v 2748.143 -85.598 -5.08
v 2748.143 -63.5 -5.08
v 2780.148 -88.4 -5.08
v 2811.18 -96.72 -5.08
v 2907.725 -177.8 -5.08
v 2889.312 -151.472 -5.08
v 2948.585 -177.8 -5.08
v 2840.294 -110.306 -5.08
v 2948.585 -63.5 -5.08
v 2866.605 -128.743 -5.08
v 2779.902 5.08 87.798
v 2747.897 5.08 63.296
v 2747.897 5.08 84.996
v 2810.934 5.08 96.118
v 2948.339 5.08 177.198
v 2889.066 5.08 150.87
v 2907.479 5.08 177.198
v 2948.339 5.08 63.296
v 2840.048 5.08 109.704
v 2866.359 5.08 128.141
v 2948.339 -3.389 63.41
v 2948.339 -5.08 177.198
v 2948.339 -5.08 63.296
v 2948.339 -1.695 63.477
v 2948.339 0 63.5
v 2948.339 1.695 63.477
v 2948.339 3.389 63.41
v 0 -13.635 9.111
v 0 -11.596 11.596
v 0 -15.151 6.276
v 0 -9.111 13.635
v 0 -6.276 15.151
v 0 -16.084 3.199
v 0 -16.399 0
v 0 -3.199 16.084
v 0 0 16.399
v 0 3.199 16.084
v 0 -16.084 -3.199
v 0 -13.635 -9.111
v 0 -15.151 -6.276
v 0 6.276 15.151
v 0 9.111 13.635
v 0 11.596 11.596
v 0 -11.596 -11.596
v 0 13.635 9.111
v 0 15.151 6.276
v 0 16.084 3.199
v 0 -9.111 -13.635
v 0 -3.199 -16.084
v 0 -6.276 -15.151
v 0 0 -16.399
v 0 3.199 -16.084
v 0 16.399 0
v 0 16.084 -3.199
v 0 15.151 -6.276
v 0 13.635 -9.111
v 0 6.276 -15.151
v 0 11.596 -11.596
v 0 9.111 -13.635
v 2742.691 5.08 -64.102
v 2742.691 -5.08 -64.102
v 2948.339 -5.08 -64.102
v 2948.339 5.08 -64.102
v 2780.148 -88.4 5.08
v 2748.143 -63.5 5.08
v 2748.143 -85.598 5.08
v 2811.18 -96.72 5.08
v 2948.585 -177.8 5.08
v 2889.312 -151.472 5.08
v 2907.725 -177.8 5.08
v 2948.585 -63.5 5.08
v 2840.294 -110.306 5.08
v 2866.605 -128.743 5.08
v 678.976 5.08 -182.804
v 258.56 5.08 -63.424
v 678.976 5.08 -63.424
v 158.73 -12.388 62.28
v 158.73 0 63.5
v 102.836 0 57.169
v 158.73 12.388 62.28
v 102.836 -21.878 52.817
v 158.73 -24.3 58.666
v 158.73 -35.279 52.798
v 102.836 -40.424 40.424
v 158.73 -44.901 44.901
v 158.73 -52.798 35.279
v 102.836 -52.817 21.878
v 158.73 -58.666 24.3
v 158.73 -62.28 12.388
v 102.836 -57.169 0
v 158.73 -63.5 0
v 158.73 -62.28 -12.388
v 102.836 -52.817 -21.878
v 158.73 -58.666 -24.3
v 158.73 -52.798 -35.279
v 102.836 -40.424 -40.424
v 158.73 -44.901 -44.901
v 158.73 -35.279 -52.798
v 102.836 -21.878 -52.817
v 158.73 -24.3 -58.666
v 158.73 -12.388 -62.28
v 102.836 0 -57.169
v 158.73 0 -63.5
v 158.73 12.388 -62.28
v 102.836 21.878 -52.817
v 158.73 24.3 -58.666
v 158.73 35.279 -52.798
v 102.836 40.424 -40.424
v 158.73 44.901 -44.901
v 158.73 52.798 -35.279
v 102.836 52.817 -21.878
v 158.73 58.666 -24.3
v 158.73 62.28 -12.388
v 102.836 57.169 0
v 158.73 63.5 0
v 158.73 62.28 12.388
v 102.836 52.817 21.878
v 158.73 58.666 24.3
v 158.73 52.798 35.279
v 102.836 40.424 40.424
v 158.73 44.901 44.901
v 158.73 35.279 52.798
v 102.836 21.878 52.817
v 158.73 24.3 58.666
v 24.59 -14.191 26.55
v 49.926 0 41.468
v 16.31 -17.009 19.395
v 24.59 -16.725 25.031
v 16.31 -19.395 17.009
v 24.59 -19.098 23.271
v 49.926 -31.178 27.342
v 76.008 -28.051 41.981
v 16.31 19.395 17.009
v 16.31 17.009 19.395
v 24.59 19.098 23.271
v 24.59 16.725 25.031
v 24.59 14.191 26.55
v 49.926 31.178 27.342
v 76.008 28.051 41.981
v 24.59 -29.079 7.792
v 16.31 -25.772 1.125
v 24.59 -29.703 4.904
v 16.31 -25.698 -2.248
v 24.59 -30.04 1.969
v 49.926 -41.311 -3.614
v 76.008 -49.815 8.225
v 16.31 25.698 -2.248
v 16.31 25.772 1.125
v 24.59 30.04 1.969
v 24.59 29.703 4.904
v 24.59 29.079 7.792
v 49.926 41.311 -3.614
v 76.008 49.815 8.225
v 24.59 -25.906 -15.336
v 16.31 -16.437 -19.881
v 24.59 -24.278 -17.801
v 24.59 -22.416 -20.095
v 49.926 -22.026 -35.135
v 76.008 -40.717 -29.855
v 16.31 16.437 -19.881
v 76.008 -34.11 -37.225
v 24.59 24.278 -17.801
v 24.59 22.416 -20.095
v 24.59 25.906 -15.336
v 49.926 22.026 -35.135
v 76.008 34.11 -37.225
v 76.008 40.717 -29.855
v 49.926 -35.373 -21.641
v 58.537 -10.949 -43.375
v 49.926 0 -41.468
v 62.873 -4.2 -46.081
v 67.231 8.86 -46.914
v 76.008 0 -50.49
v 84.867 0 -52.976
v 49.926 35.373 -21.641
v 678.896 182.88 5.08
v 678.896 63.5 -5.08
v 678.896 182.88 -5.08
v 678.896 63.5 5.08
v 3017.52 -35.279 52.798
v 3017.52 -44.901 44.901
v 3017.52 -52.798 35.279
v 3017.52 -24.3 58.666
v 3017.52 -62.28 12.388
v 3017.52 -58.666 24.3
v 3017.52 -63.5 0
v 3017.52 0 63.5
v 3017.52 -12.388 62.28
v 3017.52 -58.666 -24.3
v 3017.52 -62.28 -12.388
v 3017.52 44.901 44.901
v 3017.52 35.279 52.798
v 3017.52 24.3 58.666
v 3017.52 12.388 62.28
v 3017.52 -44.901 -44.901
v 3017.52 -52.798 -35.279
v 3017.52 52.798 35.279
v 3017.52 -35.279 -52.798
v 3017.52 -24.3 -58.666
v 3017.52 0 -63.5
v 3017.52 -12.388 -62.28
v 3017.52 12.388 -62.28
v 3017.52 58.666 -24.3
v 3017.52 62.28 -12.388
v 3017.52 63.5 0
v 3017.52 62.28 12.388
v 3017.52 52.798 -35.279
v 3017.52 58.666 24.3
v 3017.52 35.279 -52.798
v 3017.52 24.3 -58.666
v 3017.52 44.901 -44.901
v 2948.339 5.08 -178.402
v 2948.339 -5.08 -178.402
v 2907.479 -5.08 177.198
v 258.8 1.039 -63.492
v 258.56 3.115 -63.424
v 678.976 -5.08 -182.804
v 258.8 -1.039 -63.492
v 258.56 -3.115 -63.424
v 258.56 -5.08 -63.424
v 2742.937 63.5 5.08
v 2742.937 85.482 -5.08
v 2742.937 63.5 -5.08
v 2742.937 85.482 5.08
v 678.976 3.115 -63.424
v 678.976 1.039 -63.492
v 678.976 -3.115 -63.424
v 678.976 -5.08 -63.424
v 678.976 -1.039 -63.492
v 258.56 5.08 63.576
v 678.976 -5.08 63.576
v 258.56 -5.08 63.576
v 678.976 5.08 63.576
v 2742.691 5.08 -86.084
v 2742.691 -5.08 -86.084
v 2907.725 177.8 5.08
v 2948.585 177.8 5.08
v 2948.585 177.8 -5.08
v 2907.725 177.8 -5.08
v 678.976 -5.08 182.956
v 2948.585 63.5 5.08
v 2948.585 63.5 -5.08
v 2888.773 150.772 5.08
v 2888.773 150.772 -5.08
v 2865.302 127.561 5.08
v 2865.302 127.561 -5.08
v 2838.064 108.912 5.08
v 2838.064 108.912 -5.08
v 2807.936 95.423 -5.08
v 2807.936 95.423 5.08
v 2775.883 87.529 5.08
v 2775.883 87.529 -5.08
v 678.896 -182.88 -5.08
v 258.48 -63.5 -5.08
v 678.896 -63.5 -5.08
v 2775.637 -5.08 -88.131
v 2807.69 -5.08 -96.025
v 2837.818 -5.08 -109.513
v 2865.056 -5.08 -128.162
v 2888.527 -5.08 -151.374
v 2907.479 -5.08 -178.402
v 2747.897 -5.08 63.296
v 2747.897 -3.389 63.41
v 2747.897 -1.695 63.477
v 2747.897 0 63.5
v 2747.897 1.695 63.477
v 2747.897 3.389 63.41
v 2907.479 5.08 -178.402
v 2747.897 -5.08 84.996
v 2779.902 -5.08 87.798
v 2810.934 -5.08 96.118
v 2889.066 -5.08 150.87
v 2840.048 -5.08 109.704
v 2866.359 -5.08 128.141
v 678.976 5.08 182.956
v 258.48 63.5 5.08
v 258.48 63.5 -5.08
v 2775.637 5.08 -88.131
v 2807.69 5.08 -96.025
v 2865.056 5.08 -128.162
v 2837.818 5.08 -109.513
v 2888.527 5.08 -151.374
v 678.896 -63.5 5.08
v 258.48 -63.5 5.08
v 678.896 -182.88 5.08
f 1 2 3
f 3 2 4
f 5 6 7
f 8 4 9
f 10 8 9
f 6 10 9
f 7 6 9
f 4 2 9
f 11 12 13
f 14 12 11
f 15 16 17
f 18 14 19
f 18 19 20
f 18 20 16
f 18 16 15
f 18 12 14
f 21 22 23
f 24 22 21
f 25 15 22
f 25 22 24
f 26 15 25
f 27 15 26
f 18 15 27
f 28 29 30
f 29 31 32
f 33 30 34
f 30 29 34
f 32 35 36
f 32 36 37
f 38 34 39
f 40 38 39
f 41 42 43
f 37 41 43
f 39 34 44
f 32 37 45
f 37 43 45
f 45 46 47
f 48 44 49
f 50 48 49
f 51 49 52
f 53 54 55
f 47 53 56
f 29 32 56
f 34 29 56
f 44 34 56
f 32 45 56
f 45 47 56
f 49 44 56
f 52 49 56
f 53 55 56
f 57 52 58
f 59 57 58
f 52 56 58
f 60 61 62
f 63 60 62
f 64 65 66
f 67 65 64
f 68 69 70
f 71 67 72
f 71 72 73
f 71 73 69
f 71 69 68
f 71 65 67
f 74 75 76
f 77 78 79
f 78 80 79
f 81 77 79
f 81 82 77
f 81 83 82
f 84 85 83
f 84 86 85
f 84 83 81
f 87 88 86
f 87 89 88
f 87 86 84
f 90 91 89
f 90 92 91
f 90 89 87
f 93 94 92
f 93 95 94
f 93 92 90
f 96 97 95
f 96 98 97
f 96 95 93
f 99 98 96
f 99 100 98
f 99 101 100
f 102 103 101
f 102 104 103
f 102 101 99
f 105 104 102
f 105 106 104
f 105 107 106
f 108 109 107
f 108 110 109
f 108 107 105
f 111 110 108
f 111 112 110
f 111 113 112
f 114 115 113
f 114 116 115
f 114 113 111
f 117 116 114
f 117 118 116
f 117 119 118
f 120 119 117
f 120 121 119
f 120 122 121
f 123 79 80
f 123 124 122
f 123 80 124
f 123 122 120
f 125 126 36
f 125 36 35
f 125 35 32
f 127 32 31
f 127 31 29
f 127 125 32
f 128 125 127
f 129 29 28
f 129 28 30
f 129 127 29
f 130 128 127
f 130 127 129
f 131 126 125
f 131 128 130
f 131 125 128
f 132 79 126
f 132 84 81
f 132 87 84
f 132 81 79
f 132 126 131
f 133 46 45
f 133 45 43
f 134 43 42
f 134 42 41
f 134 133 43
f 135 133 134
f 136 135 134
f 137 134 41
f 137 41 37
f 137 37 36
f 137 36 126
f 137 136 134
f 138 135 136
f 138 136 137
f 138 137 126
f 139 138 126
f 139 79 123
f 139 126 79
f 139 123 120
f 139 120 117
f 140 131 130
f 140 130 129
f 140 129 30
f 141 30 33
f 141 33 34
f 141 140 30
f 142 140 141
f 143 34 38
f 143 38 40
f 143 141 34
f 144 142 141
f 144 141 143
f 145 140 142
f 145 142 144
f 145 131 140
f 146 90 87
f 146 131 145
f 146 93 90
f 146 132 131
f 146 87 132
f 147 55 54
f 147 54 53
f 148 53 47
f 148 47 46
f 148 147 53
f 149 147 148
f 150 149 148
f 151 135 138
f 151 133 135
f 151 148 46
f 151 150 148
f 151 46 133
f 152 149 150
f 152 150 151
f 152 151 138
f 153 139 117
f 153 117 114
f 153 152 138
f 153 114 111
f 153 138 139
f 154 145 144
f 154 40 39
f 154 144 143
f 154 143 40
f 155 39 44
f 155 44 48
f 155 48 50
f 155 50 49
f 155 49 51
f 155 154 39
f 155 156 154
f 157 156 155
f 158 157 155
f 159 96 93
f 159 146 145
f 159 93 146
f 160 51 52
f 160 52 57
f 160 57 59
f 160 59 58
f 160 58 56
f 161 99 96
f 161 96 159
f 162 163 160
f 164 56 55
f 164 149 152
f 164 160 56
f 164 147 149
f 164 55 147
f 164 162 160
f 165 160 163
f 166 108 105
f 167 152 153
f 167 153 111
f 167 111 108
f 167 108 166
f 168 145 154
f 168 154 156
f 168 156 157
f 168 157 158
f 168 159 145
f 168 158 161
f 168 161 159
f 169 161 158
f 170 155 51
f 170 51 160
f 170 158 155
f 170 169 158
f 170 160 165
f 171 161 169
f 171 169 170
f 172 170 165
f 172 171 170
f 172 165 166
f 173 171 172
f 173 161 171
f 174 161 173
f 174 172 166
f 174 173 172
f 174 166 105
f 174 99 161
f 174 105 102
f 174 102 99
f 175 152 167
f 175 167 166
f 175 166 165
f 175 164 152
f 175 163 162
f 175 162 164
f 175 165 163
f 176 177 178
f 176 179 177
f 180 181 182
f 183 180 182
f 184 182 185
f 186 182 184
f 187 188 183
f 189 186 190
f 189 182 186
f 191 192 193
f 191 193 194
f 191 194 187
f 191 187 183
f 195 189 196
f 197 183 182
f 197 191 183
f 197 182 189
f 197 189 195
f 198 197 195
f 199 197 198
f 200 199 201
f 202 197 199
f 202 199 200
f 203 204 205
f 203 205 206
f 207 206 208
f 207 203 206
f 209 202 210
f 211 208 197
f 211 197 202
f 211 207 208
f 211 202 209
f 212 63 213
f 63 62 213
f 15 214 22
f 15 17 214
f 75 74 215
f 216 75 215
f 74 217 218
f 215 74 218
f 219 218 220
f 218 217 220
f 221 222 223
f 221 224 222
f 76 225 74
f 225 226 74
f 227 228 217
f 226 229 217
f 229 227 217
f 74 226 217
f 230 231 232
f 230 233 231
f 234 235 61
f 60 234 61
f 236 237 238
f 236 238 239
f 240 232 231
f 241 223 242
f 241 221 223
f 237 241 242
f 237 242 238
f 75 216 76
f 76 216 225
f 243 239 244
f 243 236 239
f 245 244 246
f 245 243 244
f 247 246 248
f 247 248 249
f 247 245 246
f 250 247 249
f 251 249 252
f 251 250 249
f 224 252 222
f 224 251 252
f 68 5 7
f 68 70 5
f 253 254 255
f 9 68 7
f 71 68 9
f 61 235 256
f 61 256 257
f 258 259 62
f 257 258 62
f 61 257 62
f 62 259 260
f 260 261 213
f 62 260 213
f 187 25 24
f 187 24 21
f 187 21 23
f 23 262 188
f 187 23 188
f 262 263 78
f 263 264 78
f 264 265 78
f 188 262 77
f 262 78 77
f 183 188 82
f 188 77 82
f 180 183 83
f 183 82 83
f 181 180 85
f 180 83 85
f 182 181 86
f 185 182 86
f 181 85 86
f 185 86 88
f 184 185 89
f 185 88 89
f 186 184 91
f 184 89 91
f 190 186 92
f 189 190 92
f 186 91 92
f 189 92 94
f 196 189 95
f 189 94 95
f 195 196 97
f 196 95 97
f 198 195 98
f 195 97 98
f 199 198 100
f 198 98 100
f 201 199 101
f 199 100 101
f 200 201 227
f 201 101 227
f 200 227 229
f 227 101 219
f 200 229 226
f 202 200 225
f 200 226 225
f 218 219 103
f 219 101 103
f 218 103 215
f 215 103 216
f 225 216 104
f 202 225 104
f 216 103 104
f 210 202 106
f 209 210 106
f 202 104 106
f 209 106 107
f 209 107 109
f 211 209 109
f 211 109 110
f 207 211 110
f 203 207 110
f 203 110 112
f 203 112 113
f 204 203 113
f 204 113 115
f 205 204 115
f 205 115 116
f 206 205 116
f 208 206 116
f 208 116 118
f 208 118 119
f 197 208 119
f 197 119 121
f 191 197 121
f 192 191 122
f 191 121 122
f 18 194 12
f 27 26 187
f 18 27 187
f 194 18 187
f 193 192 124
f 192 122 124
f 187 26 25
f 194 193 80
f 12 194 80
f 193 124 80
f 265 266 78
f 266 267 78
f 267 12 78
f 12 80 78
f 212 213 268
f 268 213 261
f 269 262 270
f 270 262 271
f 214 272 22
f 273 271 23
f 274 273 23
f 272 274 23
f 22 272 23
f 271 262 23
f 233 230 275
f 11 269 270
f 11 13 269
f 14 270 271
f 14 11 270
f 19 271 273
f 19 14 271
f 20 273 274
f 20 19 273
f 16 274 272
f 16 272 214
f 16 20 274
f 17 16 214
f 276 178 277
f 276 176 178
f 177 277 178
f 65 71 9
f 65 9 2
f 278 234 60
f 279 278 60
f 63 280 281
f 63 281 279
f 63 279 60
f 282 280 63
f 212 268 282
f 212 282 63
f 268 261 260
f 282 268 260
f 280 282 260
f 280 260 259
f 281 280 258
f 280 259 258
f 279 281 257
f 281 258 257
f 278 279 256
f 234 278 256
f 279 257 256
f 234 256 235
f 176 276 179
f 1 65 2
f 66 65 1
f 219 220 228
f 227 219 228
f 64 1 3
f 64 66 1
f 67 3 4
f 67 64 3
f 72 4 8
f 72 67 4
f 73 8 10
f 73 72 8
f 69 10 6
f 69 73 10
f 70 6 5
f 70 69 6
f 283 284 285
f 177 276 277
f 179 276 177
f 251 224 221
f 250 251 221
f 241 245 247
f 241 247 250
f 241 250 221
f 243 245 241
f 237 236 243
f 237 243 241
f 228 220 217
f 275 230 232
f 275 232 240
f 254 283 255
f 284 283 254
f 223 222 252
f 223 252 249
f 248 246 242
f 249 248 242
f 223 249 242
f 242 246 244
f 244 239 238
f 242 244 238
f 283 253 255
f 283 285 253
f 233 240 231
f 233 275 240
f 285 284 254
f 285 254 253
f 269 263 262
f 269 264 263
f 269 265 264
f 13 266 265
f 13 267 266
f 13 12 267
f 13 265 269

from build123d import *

# Parameters (mm, degrees)
BOSS_EXTRUDE2_START   = 3017.52
SKETCH4_R             = 16.398945734
BOSS_EXTRUDE2_DEPTH   = 3017.52
BOSS_EXTRUDE3_DEPTH   = 5.08
BOSS_EXTRUDE3_2_DEPTH = 5.08
BOSS_EXTRUDE4_DEPTH   = 5.08
BOSS_EXTRUDE5_DEPTH   = 5.08
BOSS_EXTRUDE5_2_DEPTH = 5.08
BOSS_EXTRUDE6_DEPTH   = 5.08


with BuildPart() as part:
    # Sketch1 → Revolve4 (revolve)
    with BuildSketch(Plane.XY):
        with BuildLine():
            Line((3017.52, 63.5), (158.730277168, 63.5))
            add(Edge.make_bspline(
                [(0, 16.398945734), (72.649922377, 61.029885538), (158.730277168, 63.5)],
                knots=[0, 0, 0, 1, 1, 1], degree=2))
            Line((0, 16.398945734), (3017.52, 16.398945734))
            Line((3017.52, 16.398945734), (3017.52, 63.5))
        make_face()
    revolve(axis=Axis((0, 0, 0), (1, 0, 0)))

    # Sketch4 → Boss-Extrude2 (add)
    with BuildSketch(Plane(origin=(0, 0, 0), x_dir=(0, 0, -1), z_dir=(1, 0, 0)).offset(BOSS_EXTRUDE2_START)):
        Circle(SKETCH4_R)
    extrude(amount=-BOSS_EXTRUDE2_DEPTH)

    # Sketch7 → Boss-Extrude4 (add, symmetric)
    with BuildSketch(Plane(origin=(0, 0, 0), x_dir=(1, 0, 0), z_dir=(0, 1, 0))):
        with BuildLine():
            Line((2742.690743974, 64.10161135), (2948.339123975, 64.10161135))
            Line((2948.339123975, 64.10161135), (2948.339123975, 178.40161135))
            Line((2948.339123975, 178.40161135), (2907.479013417, 178.40161135))
            ThreePointArc((2907.479013417, 178.40161135), (2837.818453284, 109.513208892), (2742.690743974, 86.084069922))
            Line((2742.690743974, 86.084069922), (2742.690743974, 64.10161135))
        make_face()
        with BuildLine():
            Line((2948.339123975, -177.19838865), (2948.339123975, -62.89838865))
            Line((2948.339123975, -62.89838865), (2747.896846012, -62.89838865))
            Line((2747.896846012, -62.89838865), (2747.896846012, -84.99638865))
            ThreePointArc((2747.896846012, -84.99638865), (2840.048456129, -109.703930927), (2907.479013515, -177.19838865))
            Line((2907.479013515, -177.19838865), (2948.339123975, -177.19838865))
        make_face()
    extrude(amount=BOSS_EXTRUDE4_DEPTH, both=True)


with BuildPart() as body_2:
    # Sketch5 → Boss-Extrude3 (new, symmetric)
    with BuildSketch(Plane.XY):
        with BuildLine():
            Line((2742.936552939, 63.5), (2948.58493294, 63.5))
            Line((2948.58493294, 63.5), (2948.58493294, 177.8))
            Line((2948.58493294, 177.8), (2907.724822382, 177.8))
            ThreePointArc((2907.724822382, 177.8), (2838.064262249, 108.911597541), (2742.936552939, 85.482458571))
            Line((2742.936552939, 85.482458571), (2742.936552939, 63.5))
        make_face()
    extrude(amount=BOSS_EXTRUDE3_DEPTH, both=True)


with BuildPart() as body_3:
    # Sketch5 → Boss-Extrude3 2 (new, symmetric)
    with BuildSketch(Plane.XY):
        with BuildLine():
            Line((2948.58493294, -177.8), (2948.58493294, -63.5))
            Line((2948.58493294, -63.5), (2748.142654977, -63.5))
            Line((2748.142654977, -63.5), (2748.142654977, -85.598))
            ThreePointArc((2748.142654977, -85.598), (2840.294265094, -110.305542277), (2907.72482248, -177.8))
            Line((2907.72482248, -177.8), (2948.58493294, -177.8))
        make_face()
    extrude(amount=BOSS_EXTRUDE3_2_DEPTH, both=True)


with BuildPart() as boss_extrude4_piece_1:
    # of the separate pieces the step leaves, piece 1, a body of its own (boss_extrude4_pieces)
    add(part.part.solids().sort_by_distance((3017.52, 63.5, 0))[0])

    # Sketch10 → Boss-Extrude6 (add, symmetric)
    with BuildSketch(Plane(origin=(0, 0, 0), x_dir=(1, 0, 0), z_dir=(0, 1, 0))):
        Polygon((678.976478206, 182.803541386), (258.560162791, 63.423541386), (678.976478206, 63.423541386), align=None)
        Polygon((678.976478206, -63.576458614), (258.560162791, -63.576458614), (678.976478206, -182.956458614), align=None)
    extrude(amount=BOSS_EXTRUDE6_DEPTH, both=True)


with BuildPart() as boss_extrude4_piece_2:
    # of the separate pieces the step leaves, piece 2, a body of its own (boss_extrude4_pieces)
    add(part.part.solids().sort_by_distance((2742.690743974, -5.08, -86.084069922))[0])


with BuildPart() as body_5:
    # Sketch8 → Boss-Extrude5 (new, symmetric)
    with BuildSketch(Plane.XY):
        Polygon((678.896134422, 182.88), (258.479819006, 63.5), (678.896134422, 63.5), align=None)
    extrude(amount=BOSS_EXTRUDE5_DEPTH, both=True)


with BuildPart() as body_6:
    # Sketch8 → Boss-Extrude5 2 (new, symmetric)
    with BuildSketch(Plane.XY):
        Polygon((678.896134422, -63.5), (258.479819006, -63.5), (678.896134422, -182.88), align=None)
    extrude(amount=BOSS_EXTRUDE5_2_DEPTH, both=True)


with BuildPart() as boss_extrude6_piece_1:
    # of the separate pieces the step leaves, piece 1, a body of its own (boss_extrude6_pieces)
    add(boss_extrude4_piece_1.part.solids().sort_by_distance((3017.52, 63.5, 0))[0])


with BuildPart() as boss_extrude6_piece_2:
    # of the separate pieces the step leaves, piece 2, a body of its own (boss_extrude6_pieces)
    add(boss_extrude4_piece_1.part.solids().sort_by_distance((678.976478206, -5.08, 63.576458614))[0])


solid = Compound([body_2.part, body_3.part, boss_extrude4_piece_2.part, body_5.part, body_6.part, boss_extrude6_piece_1.part, boss_extrude6_piece_2.part])
